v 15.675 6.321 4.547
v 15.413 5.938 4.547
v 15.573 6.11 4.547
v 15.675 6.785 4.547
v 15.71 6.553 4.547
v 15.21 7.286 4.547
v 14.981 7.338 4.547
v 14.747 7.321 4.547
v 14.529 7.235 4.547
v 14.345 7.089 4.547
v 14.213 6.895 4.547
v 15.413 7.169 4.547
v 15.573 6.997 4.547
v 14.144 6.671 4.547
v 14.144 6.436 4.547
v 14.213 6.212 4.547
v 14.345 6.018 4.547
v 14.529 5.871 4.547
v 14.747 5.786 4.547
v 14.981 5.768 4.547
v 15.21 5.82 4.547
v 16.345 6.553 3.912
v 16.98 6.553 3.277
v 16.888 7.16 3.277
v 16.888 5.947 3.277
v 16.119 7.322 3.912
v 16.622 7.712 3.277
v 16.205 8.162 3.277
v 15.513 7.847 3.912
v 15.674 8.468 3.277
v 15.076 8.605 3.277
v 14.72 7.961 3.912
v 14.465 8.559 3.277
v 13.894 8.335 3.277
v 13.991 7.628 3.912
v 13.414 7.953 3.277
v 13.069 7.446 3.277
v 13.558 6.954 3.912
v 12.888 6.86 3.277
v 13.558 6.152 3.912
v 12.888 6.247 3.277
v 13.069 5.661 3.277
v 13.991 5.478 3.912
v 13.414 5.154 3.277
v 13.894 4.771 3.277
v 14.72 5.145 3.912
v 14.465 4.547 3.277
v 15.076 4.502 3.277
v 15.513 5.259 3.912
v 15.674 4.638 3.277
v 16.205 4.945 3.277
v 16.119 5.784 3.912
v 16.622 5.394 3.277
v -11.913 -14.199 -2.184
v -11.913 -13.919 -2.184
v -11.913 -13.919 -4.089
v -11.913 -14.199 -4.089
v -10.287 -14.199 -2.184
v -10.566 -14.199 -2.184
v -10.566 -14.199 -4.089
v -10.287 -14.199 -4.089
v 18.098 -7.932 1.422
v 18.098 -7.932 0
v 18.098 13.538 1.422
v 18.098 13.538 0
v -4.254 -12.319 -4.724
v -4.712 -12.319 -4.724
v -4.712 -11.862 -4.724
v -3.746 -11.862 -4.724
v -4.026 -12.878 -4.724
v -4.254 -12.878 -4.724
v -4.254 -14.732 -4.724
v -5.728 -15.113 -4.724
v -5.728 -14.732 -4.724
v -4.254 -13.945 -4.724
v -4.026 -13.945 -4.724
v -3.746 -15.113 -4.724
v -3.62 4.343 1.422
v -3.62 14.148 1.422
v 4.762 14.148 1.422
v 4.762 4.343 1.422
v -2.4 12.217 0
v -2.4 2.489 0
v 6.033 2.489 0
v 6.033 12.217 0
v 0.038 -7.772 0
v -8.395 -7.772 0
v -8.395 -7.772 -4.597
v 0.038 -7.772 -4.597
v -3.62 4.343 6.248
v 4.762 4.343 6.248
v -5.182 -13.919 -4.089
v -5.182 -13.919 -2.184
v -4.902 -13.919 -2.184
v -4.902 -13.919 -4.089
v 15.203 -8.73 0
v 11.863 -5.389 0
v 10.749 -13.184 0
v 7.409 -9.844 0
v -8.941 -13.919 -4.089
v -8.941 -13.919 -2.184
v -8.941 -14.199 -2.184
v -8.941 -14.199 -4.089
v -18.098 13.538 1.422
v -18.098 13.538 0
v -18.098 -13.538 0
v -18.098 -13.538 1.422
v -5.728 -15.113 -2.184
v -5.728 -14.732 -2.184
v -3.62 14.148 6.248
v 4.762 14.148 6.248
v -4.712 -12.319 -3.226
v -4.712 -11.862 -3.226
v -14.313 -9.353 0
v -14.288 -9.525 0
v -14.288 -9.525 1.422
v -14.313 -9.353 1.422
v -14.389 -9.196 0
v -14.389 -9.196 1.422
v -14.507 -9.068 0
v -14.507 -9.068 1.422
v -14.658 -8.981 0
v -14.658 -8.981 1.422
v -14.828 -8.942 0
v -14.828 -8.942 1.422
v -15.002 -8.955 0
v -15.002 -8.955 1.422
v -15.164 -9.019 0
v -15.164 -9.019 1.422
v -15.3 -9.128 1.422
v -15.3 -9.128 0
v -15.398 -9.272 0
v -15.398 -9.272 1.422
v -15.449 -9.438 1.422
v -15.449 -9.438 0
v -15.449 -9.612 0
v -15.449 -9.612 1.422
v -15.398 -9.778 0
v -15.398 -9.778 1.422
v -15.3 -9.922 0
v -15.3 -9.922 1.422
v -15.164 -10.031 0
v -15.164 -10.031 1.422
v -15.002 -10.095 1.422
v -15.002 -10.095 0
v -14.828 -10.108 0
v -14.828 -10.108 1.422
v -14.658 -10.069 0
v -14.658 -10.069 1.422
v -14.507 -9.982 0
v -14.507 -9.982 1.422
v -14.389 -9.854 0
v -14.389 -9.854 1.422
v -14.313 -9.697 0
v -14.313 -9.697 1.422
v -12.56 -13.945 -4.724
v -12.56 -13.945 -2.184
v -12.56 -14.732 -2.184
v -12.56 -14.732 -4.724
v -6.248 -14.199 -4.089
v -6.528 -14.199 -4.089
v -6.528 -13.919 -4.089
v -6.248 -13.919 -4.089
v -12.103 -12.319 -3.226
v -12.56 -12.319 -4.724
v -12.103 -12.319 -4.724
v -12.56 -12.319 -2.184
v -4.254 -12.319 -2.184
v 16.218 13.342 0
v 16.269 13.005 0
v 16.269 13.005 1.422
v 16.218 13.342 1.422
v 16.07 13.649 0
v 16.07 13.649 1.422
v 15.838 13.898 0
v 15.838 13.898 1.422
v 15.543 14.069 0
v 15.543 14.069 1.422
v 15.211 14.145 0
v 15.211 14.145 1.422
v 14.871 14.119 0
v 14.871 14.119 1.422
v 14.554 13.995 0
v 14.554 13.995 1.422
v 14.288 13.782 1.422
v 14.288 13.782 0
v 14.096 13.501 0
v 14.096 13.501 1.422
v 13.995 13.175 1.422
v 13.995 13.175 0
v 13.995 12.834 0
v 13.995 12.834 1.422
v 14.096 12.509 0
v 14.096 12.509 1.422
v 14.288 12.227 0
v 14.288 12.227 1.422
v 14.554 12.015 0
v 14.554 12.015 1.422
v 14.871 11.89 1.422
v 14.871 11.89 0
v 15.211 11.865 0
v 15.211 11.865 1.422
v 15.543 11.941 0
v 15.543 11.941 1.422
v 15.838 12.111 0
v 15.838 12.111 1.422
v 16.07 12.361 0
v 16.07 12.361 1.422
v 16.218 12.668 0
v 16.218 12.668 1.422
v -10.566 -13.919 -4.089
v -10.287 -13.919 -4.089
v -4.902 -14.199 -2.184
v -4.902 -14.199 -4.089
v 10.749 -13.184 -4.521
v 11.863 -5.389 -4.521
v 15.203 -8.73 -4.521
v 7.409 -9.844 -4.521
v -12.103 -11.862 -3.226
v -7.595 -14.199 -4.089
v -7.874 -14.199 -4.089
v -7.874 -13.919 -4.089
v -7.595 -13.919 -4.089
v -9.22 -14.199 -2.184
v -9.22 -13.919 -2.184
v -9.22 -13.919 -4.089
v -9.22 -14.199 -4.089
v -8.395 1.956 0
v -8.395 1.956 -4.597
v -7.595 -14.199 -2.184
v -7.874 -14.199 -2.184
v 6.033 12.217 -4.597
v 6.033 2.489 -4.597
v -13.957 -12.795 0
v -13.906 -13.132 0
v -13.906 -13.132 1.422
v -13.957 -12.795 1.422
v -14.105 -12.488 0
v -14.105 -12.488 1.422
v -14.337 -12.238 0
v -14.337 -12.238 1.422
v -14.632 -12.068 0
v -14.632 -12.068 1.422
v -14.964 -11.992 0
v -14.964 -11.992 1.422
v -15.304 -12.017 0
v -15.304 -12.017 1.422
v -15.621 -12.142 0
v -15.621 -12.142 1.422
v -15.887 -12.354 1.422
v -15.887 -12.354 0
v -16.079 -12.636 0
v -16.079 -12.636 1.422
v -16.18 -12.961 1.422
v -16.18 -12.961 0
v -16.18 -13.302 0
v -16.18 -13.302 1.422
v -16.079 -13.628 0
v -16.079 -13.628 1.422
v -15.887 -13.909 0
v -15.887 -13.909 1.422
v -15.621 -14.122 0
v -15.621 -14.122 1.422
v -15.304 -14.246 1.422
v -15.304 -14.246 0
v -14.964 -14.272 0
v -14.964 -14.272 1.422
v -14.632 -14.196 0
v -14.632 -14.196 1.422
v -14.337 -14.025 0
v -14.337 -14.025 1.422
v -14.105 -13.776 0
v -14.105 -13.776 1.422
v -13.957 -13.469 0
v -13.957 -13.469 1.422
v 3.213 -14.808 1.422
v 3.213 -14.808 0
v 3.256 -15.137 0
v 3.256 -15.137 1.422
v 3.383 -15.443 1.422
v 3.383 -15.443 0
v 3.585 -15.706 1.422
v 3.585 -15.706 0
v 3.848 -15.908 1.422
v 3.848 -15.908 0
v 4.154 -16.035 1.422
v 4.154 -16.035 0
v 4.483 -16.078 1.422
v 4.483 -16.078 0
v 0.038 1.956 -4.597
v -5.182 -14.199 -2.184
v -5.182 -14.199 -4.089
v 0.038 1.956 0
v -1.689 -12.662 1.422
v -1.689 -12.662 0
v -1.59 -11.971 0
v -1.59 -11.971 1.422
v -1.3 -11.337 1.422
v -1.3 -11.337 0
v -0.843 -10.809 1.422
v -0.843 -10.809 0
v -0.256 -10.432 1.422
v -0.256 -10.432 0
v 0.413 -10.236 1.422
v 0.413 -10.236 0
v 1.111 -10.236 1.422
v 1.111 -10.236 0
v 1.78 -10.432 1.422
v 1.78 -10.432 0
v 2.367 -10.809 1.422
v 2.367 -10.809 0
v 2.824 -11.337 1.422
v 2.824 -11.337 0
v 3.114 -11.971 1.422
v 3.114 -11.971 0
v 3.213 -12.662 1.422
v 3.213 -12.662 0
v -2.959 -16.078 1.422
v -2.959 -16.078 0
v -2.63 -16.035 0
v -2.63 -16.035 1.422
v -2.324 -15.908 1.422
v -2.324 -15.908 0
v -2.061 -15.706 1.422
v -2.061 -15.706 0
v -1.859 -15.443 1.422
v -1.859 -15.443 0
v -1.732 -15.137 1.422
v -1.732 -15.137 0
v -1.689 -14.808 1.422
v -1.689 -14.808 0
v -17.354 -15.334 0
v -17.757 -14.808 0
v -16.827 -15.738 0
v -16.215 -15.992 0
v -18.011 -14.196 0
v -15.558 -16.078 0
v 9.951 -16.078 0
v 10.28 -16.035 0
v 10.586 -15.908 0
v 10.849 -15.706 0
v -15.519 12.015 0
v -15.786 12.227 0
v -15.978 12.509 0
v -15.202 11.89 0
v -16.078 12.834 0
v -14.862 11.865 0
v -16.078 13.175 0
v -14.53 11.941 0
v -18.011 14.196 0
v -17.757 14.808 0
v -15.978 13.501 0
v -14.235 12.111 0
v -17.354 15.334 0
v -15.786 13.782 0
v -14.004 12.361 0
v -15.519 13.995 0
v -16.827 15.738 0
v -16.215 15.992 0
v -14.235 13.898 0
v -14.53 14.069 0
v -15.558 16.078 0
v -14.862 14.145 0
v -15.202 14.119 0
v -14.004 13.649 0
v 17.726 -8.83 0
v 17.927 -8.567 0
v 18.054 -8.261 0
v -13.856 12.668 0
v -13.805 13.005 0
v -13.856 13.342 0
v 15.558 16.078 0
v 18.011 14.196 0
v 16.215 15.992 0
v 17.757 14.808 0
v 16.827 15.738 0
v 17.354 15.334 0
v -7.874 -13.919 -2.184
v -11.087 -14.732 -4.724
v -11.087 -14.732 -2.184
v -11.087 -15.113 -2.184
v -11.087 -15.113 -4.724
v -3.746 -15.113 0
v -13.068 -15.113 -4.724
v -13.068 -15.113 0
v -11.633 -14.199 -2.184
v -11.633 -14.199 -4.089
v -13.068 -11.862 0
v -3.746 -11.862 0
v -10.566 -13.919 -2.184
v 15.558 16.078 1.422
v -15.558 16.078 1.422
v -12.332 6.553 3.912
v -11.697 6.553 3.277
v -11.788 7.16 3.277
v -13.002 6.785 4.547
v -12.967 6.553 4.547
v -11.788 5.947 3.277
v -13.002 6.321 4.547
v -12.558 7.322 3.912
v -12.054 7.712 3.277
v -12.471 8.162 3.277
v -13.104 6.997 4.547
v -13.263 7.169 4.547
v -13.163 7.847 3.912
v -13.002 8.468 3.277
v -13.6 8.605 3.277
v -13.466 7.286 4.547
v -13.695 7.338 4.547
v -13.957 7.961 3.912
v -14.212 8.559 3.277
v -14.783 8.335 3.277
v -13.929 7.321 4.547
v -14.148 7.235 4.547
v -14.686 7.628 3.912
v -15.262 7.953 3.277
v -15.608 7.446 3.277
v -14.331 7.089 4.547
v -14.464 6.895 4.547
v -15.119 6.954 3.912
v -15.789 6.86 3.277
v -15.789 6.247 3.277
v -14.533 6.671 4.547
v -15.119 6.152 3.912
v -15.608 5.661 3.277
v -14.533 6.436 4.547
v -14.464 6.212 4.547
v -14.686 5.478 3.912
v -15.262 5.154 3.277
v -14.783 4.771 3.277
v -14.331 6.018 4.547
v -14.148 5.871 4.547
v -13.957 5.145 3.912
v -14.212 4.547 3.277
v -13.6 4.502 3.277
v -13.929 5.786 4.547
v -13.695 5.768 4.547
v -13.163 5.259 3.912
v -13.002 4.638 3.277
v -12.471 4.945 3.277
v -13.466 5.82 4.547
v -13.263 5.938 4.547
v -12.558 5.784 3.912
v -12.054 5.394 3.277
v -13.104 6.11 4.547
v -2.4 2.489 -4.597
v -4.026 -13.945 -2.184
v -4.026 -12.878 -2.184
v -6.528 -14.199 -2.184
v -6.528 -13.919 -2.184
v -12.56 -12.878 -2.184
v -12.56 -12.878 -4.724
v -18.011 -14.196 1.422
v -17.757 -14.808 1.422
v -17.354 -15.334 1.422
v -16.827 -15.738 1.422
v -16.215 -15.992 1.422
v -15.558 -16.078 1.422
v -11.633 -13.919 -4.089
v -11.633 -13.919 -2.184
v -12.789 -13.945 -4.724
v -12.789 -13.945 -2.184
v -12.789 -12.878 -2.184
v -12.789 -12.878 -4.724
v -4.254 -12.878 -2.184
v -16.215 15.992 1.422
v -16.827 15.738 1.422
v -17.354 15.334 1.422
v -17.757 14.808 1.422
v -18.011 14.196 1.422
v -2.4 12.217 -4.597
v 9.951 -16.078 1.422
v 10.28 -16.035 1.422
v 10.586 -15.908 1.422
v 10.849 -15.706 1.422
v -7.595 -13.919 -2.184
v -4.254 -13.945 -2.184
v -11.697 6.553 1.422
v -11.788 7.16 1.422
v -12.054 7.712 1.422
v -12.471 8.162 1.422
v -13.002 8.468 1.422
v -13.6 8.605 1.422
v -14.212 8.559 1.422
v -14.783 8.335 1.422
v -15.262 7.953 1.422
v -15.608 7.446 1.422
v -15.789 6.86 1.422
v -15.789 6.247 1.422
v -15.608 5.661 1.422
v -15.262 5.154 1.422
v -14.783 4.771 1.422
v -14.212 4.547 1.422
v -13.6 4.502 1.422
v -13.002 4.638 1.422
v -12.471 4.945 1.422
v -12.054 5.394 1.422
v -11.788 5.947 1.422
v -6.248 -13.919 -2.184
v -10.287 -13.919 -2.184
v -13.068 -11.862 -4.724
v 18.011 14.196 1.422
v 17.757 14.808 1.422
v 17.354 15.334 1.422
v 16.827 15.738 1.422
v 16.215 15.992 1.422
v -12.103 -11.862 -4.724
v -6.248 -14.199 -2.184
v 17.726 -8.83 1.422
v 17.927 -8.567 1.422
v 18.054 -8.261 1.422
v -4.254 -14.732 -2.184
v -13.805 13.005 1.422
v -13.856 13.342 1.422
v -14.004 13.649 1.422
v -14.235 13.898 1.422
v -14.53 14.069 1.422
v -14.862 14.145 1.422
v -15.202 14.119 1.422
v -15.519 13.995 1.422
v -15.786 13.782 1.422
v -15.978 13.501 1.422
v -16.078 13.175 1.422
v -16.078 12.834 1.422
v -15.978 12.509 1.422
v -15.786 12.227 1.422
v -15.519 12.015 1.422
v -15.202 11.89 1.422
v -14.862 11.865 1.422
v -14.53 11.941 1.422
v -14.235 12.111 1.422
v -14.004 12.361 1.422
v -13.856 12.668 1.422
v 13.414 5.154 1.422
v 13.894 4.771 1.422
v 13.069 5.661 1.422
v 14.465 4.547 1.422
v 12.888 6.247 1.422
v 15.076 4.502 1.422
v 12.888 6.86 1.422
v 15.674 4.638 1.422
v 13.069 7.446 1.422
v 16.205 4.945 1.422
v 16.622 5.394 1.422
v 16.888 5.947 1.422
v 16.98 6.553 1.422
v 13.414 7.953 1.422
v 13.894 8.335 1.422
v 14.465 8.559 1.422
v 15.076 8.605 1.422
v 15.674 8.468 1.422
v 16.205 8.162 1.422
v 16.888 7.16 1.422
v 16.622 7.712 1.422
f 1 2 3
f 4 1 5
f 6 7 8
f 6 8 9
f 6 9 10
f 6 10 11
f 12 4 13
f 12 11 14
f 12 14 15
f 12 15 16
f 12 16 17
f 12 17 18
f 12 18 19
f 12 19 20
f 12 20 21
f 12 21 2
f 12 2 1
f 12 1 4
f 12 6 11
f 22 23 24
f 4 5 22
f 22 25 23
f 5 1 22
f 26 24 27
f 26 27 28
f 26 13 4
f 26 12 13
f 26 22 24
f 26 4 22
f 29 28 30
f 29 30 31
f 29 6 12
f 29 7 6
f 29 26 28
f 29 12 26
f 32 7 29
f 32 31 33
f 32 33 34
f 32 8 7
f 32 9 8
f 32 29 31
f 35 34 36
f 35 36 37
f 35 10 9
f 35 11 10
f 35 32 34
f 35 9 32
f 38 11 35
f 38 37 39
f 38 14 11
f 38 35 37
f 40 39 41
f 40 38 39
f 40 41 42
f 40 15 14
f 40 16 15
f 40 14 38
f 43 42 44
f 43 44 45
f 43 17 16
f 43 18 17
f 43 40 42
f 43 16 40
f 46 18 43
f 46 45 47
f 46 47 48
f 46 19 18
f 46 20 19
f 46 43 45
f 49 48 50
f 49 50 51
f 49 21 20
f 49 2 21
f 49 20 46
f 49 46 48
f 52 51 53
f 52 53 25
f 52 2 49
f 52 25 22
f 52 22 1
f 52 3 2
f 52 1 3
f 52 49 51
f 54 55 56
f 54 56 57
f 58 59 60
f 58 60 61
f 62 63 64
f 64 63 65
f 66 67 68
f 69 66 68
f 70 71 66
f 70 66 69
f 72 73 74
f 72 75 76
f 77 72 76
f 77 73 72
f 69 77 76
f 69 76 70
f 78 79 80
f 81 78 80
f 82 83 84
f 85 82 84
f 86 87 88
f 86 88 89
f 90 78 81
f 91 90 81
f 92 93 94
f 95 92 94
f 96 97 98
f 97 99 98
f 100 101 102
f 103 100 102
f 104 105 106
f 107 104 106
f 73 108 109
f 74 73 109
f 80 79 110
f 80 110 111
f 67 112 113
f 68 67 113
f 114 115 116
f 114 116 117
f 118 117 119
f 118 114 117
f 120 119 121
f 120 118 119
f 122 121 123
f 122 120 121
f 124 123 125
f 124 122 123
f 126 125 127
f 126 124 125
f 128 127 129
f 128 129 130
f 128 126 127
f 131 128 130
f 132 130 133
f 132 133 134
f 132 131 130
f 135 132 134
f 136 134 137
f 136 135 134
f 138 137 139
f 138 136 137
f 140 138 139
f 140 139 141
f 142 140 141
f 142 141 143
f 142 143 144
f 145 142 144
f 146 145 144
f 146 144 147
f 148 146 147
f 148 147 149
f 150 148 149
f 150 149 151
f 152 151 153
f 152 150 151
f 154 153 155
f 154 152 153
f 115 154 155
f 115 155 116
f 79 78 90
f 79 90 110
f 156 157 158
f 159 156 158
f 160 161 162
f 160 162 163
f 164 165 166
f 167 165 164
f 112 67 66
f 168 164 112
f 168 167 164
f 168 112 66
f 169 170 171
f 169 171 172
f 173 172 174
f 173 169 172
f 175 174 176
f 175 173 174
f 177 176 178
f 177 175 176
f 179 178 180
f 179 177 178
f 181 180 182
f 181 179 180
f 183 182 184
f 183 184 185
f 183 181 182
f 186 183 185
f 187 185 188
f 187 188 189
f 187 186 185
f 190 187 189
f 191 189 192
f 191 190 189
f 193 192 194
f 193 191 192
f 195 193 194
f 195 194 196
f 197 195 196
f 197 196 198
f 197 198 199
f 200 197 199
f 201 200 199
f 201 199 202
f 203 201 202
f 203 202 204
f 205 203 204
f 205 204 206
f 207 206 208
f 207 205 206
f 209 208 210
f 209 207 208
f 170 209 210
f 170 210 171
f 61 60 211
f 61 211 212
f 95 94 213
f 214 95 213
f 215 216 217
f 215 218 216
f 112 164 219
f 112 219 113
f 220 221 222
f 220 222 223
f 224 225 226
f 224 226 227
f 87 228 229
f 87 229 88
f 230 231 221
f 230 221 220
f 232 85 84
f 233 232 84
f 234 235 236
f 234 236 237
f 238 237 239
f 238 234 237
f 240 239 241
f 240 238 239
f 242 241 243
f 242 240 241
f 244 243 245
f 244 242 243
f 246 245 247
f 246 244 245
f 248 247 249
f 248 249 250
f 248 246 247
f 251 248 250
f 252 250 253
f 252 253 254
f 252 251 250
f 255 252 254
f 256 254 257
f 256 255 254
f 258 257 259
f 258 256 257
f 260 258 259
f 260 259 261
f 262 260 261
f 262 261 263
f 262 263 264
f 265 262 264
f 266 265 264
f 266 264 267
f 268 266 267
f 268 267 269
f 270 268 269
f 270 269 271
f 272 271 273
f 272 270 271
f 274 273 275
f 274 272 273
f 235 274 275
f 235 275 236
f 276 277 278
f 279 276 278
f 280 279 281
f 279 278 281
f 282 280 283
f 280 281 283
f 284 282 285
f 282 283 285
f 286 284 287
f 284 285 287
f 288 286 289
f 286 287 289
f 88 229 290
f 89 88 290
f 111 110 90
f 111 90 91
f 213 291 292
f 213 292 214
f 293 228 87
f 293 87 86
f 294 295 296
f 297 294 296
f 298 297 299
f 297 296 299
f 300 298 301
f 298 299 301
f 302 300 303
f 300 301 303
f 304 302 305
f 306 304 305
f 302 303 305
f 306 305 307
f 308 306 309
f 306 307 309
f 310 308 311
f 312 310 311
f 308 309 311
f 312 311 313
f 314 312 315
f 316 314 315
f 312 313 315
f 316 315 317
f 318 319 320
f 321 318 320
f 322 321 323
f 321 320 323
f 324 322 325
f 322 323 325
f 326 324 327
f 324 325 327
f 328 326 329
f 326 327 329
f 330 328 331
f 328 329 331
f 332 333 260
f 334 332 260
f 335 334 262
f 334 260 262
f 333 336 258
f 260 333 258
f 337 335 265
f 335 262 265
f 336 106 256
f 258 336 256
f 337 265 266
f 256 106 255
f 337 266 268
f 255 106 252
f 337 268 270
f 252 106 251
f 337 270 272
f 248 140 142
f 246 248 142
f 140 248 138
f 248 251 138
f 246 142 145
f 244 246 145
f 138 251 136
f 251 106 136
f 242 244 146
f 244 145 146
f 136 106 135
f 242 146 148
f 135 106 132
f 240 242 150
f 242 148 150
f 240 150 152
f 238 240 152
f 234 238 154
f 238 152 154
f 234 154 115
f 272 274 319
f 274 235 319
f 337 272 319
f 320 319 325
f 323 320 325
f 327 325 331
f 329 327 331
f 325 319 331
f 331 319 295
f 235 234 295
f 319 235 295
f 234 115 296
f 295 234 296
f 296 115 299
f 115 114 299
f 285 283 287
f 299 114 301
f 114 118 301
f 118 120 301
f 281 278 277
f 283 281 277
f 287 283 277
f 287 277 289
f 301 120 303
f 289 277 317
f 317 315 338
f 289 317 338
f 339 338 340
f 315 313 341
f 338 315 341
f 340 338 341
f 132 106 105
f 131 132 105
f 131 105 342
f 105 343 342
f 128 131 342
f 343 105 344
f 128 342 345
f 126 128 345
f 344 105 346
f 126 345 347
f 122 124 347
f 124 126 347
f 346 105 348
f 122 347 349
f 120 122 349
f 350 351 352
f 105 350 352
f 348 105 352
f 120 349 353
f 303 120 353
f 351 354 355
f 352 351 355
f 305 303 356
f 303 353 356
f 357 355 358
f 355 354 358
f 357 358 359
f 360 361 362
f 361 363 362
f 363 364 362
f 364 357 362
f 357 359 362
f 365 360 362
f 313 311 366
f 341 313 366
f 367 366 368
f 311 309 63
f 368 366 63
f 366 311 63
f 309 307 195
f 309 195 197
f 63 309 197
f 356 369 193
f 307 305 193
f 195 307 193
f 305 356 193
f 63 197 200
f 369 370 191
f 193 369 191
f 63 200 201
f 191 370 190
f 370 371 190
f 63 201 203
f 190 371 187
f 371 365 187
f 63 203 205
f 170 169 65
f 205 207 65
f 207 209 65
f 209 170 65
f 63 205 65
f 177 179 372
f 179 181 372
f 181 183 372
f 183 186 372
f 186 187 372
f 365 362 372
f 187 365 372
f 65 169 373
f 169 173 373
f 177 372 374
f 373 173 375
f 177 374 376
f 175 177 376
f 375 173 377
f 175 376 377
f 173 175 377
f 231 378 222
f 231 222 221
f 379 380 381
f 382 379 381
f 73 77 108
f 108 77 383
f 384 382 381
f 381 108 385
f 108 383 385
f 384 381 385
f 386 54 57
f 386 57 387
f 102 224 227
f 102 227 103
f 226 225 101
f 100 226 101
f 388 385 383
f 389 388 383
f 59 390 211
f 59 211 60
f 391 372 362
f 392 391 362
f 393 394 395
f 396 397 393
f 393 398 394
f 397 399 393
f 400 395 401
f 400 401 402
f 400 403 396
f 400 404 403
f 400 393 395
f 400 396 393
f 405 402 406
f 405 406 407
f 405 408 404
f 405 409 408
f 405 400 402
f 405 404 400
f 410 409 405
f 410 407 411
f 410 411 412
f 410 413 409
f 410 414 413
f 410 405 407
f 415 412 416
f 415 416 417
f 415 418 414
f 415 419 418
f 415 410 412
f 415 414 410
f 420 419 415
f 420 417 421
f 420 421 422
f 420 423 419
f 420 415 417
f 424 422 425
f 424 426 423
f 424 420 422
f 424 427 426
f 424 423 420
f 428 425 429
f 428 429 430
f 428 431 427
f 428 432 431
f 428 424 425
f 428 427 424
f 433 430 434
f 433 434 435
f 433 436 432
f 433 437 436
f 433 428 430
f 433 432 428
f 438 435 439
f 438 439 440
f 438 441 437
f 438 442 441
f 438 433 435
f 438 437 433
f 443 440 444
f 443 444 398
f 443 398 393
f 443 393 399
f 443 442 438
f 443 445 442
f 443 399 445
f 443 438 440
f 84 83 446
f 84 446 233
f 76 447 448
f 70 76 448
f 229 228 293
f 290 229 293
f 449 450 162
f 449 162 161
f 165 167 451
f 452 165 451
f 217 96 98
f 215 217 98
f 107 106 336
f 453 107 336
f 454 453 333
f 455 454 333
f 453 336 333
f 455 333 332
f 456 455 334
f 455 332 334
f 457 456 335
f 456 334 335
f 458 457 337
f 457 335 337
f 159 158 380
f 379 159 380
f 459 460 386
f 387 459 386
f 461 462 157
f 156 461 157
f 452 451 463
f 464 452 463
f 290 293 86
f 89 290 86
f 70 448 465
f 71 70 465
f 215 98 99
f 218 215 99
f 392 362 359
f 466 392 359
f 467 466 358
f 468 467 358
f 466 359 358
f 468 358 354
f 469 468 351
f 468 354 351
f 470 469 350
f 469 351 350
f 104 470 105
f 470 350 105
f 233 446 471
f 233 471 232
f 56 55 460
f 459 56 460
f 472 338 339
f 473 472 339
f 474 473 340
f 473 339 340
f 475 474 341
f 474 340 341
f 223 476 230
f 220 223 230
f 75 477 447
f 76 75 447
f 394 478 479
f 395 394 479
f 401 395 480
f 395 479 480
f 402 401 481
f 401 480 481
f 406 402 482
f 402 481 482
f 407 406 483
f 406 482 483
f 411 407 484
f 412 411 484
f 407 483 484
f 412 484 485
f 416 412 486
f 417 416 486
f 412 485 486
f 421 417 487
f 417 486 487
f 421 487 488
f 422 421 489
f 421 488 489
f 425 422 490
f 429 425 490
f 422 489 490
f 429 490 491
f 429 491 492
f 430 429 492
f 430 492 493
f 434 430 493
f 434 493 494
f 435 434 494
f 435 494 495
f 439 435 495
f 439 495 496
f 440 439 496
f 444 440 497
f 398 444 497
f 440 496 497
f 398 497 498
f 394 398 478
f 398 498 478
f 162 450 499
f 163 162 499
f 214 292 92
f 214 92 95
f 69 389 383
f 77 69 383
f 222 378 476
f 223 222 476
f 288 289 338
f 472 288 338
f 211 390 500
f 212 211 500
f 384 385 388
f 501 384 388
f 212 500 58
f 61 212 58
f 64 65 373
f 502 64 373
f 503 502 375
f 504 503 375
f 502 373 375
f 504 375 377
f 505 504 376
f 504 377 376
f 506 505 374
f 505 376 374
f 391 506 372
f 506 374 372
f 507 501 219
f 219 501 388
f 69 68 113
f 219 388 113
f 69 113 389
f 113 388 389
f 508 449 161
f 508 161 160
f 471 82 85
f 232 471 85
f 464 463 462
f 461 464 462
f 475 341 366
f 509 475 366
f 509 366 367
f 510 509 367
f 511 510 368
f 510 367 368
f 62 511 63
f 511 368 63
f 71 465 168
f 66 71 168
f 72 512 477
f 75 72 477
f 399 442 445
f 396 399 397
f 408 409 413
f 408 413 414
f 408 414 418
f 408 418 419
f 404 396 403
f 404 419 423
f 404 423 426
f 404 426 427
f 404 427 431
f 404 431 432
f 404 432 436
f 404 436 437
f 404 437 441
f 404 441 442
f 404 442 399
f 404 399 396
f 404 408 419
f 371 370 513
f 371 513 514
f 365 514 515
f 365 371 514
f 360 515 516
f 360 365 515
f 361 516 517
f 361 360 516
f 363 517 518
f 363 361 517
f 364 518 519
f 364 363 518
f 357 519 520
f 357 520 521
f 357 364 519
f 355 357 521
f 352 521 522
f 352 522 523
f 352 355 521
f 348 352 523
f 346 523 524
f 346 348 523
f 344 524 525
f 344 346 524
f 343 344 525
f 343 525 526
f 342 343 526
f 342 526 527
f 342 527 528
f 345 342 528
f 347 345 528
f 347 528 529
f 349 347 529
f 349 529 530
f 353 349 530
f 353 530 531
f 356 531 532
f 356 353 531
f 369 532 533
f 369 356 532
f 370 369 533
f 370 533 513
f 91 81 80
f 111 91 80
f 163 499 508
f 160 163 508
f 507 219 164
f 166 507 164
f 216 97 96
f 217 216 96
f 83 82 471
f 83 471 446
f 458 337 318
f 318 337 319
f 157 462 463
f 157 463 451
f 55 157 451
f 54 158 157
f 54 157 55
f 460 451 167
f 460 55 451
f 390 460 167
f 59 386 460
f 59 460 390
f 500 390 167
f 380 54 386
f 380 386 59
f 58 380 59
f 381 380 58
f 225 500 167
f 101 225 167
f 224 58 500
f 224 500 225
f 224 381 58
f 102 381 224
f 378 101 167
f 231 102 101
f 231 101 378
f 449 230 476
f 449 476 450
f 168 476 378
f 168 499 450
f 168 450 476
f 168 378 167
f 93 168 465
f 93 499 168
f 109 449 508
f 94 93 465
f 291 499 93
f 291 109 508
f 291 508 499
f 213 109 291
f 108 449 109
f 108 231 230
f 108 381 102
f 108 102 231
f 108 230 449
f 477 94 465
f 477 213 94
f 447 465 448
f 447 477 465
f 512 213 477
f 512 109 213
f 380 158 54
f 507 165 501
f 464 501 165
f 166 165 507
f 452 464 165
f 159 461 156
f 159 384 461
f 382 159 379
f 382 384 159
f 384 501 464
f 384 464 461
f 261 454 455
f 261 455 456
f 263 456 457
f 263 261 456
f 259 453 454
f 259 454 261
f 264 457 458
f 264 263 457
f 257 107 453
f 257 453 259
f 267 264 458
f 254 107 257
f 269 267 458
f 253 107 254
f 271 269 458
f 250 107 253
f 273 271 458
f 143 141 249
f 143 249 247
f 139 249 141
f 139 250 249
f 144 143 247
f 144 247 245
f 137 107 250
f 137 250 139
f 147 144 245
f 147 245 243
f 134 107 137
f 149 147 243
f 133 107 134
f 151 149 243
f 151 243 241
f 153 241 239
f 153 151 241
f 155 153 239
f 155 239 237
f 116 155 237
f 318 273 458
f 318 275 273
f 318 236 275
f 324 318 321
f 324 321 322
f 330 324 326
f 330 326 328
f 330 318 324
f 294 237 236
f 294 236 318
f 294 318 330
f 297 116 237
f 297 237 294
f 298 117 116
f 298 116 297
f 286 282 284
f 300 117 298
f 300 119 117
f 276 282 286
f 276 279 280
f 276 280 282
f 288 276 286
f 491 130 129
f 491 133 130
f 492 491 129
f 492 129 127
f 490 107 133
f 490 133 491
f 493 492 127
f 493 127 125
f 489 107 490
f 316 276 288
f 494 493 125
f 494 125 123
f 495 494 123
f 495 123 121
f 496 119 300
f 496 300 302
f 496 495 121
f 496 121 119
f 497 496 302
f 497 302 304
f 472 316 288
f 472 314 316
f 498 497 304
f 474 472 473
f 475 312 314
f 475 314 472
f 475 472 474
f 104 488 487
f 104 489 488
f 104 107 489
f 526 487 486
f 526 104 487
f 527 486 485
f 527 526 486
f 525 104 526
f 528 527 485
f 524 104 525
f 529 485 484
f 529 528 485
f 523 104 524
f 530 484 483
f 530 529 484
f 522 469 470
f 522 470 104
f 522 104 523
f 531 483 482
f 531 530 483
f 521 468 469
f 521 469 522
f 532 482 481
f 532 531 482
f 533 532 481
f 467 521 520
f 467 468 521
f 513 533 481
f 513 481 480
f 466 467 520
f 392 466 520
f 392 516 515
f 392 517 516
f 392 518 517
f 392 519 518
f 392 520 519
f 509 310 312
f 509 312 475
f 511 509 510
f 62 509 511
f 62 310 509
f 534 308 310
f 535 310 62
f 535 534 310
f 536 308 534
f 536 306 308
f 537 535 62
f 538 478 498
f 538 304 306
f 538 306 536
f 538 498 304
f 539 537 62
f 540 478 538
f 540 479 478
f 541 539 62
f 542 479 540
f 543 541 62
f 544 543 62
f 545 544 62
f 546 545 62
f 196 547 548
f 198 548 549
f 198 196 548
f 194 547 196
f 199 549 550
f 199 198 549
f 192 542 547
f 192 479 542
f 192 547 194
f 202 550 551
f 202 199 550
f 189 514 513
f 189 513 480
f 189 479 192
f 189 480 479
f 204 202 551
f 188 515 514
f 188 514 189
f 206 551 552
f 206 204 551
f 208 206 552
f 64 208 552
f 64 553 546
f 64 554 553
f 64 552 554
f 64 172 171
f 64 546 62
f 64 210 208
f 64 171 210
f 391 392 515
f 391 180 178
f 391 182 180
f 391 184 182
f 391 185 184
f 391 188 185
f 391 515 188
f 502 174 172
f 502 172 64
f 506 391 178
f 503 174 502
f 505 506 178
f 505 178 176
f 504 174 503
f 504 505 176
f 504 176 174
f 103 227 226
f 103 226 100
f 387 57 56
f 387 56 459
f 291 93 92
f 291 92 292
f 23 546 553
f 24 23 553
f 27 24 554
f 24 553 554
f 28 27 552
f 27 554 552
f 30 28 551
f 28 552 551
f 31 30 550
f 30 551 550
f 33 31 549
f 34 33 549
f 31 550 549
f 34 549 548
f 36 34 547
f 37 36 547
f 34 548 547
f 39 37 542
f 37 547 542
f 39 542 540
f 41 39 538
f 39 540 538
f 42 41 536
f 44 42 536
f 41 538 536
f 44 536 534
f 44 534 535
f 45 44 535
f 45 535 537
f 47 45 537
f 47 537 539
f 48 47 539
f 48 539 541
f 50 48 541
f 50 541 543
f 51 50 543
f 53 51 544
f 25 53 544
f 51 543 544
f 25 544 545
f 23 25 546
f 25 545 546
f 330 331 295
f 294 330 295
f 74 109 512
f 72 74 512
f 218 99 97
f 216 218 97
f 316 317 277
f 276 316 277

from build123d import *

# Parameters (mm, degrees)
F0_R      = 1.143
F0_R_2    = 0.5842
F1_DEPTH  = 1.4224
F2_W      = 8.382
F2_H      = 9.8044
F3_DEPTH  = 4.826
F2_R      = 2.0574
F4_DEPTH  = 3.1242
F5_SIZE   = 1.27
F6_W      = 8.4328
F6_H      = 9.7282
F7_DEPTH  = 4.5974
F8_DEPTH  = 4.5212
F9_W      = 5.3594
F9_H      = 0.381
F10_DEPTH = 2.1844
F11_DEPTH = 4.7244
F9_W_2    = 7.3914
F9_H_2    = 0.4572
F12_DEPTH = 3.2258
F13_W     = 0.2794
F13_H     = 0.2794
F14_DEPTH = 1.905


with BuildPart() as f1:
    # F0 (on Top) → F1 (new body)
    with BuildSketch(Plane.XY):
        with BuildLine():
            Line((15.5575, 16.0782), (-15.5575, 16.0782))
            ThreePointArc((-15.5575, 16.0782), (-17.3535512242, 15.3342512242), (-18.0975, 13.5382))
            Line((-18.0975, 13.5382), (-18.0975, -13.5382))
            ThreePointArc((-18.0975, -13.5382), (-17.3535512242, -15.3342512242), (-15.5575, -16.0782))
            Line((-15.5575, -16.0782), (-2.9591, -16.0782))
            ThreePointArc((-2.9591, -16.0782), (-2.0610743879, -15.7062256121), (-1.6891, -14.8082))
            Line((-1.6891, -14.8082), (-1.6891, -12.6619))
            ThreePointArc((-1.6891, -12.6619), (0.762, -10.2108), (3.2131, -12.6619))
            Line((3.2131, -12.6619), (3.2131, -14.8082))
            ThreePointArc((3.2131, -14.8082), (3.5850743879, -15.7062256121), (4.4831, -16.0782))
            Line((4.4831, -16.0782), (9.9514487758, -16.0782))
            ThreePointArc((9.9514487758, -16.0782), (10.4374567349, -15.9815270063), (10.8494743879, -15.7062256121))
            Line((10.8494743879, -15.7062256121), (17.7255256121, -8.8301743879))
            ThreePointArc((17.7255256121, -8.8301743879), (18.0008270063, -8.4181567349), (18.0975, -7.9321487758))
            Line((18.0975, -7.9321487758), (18.0975, 13.5382))
            ThreePointArc((18.0975, 13.5382), (17.3535512242, 15.3342512242), (15.5575, 16.0782))
        make_face()
        with Locations((-15.0495, -13.1318)):
            Circle(F0_R, mode=Mode.SUBTRACT)
        with Locations((-14.8717, -9.525)):
            Circle(F0_R_2, mode=Mode.SUBTRACT)
        with Locations((-14.9479, 13.0048)):
            Circle(F0_R, mode=Mode.SUBTRACT)
        with Locations((15.1257, 13.0048)):
            Circle(F0_R, mode=Mode.SUBTRACT)
    extrude(amount=F1_DEPTH)

    # F2 (on face) → F4 (join)
    with BuildSketch(Plane.XY.offset(1.4224)):
        with Locations((-13.7541, 6.5532)):
            Circle(F2_R)
        with Locations((14.9225, 6.5532)):
            Circle(F2_R)
    extrude(amount=F4_DEPTH)

    # F5
    f5_edges = [f1.edges().sort_by_distance(p)[0] for p in [
        (-15.8115, 6.5532, 4.5466),
        (12.8651, 6.5532, 4.5466),
    ]]
    chamfer(f5_edges, length=F5_SIZE)


with BuildPart() as f3:
    # F2 (on face) → F3 (new body)
    with BuildSketch(Plane.XY.offset(1.4224)):
        with Locations((0.5715, 9.2456)):
            Rectangle(F2_W, F2_H)
    extrude(amount=F3_DEPTH)


with BuildPart() as f7:
    # F6 (on face) → F7 (new body)
    with BuildSketch(Plane(origin=(0, 0, 0), x_dir=(1, 0, 0), z_dir=(0, 0, -1))):
        with Locations((1.8161, -7.3533)):
            Rectangle(F6_W, F6_H)
    extrude(amount=F7_DEPTH)


with BuildPart() as f7b:
    # F6 (on face) → F7, piece 2 (new body)
    with BuildSketch(Plane(origin=(0, 0, 0), x_dir=(1, 0, 0), z_dir=(0, 0, -1))):
        with Locations((-4.1783, 2.9083)):
            Rectangle(F6_W, F6_H)
    extrude(amount=F7_DEPTH)


with BuildPart() as f8:
    # F6 (on face) → F8 (new body)
    with BuildSketch(Plane(origin=(0, 0, 0), x_dir=(1, 0, 0), z_dir=(0, 0, -1))):
        Polygon((11.8628308473, 5.3893238113), (15.2034861243, 8.7299790883), (10.7492790883, 13.1841861243), (7.4086238113, 9.8435308473), align=None)
    extrude(amount=F8_DEPTH)


with BuildPart() as f10:
    # F9 (on face) → F10 (new body)
    with BuildSketch(Plane(origin=(0, 0, 0), x_dir=(1, 0, 0), z_dir=(0, 0, -1))):
        Polygon((-12.1031, 12.319), (-4.7117, 12.319), (-4.2545, 12.319), (-4.2545, 12.8778), (-4.0259, 12.8778), (-4.0259, 13.9446), (-4.2545, 13.9446), (-4.2545, 14.732), (-5.7277, 14.732), (-11.0871, 14.732), (-12.5603, 14.732), (-12.5603, 13.9446), (-12.7889, 13.9446), (-12.7889, 12.8778), (-12.5603, 12.8778), (-12.5603, 12.319), align=None)
        with Locations((-8.4074, 14.9225)):
            Rectangle(F9_W, F9_H)
    extrude(amount=F10_DEPTH)

    # F9 (on face) → F11 (join)
    with BuildSketch(Plane(origin=(0, 0, 0), x_dir=(1, 0, 0), z_dir=(0, 0, -1))):
        Polygon((-4.7117, 11.8618), (-3.7465, 11.8618), (-3.7465, 15.113), (-5.7277, 15.113), (-5.7277, 14.732), (-4.2545, 14.732), (-4.2545, 13.9446), (-4.0259, 13.9446), (-4.0259, 12.8778), (-4.2545, 12.8778), (-4.2545, 12.319), (-4.7117, 12.319), align=None)
        Polygon((-13.0683, 11.8618), (-12.1031, 11.8618), (-12.1031, 12.319), (-12.5603, 12.319), (-12.5603, 12.8778), (-12.7889, 12.8778), (-12.7889, 13.9446), (-12.5603, 13.9446), (-12.5603, 14.732), (-11.0871, 14.732), (-11.0871, 15.113), (-13.0683, 15.113), align=None)
    extrude(amount=F11_DEPTH)

    # F9 (on face) → F12 (join)
    with BuildSketch(Plane(origin=(0, 0, 0), x_dir=(1, 0, 0), z_dir=(0, 0, -1))):
        with Locations((-8.4074, 12.0904)):
            Rectangle(F9_W_2, F9_H_2)
    extrude(amount=F12_DEPTH)

    # F13 (on face) → F14 (join)
    with BuildSketch(Plane(origin=(0, 0, -2.1844), x_dir=(1, 0, 0), z_dir=(0, 0, -1))):
        with Locations((-11.7729, 14.0589)):
            Rectangle(F13_W, F13_H)
        with Locations((-10.4267, 14.0589)):
            Rectangle(F13_W, F13_H)
        with Locations((-9.0805, 14.0589)):
            Rectangle(F13_W, F13_H)
        with Locations((-5.0419, 14.0589)):
            Rectangle(F13_W, F13_H)
        with Locations((-6.3881, 14.0589)):
            Rectangle(F13_W, F13_H)
        with Locations((-7.7343, 14.0589)):
            Rectangle(F13_W, F13_H)
    extrude(amount=F14_DEPTH)


solid = Compound([f1.part, f3.part, f7.part, f7b.part, f8.part, f10.part])
